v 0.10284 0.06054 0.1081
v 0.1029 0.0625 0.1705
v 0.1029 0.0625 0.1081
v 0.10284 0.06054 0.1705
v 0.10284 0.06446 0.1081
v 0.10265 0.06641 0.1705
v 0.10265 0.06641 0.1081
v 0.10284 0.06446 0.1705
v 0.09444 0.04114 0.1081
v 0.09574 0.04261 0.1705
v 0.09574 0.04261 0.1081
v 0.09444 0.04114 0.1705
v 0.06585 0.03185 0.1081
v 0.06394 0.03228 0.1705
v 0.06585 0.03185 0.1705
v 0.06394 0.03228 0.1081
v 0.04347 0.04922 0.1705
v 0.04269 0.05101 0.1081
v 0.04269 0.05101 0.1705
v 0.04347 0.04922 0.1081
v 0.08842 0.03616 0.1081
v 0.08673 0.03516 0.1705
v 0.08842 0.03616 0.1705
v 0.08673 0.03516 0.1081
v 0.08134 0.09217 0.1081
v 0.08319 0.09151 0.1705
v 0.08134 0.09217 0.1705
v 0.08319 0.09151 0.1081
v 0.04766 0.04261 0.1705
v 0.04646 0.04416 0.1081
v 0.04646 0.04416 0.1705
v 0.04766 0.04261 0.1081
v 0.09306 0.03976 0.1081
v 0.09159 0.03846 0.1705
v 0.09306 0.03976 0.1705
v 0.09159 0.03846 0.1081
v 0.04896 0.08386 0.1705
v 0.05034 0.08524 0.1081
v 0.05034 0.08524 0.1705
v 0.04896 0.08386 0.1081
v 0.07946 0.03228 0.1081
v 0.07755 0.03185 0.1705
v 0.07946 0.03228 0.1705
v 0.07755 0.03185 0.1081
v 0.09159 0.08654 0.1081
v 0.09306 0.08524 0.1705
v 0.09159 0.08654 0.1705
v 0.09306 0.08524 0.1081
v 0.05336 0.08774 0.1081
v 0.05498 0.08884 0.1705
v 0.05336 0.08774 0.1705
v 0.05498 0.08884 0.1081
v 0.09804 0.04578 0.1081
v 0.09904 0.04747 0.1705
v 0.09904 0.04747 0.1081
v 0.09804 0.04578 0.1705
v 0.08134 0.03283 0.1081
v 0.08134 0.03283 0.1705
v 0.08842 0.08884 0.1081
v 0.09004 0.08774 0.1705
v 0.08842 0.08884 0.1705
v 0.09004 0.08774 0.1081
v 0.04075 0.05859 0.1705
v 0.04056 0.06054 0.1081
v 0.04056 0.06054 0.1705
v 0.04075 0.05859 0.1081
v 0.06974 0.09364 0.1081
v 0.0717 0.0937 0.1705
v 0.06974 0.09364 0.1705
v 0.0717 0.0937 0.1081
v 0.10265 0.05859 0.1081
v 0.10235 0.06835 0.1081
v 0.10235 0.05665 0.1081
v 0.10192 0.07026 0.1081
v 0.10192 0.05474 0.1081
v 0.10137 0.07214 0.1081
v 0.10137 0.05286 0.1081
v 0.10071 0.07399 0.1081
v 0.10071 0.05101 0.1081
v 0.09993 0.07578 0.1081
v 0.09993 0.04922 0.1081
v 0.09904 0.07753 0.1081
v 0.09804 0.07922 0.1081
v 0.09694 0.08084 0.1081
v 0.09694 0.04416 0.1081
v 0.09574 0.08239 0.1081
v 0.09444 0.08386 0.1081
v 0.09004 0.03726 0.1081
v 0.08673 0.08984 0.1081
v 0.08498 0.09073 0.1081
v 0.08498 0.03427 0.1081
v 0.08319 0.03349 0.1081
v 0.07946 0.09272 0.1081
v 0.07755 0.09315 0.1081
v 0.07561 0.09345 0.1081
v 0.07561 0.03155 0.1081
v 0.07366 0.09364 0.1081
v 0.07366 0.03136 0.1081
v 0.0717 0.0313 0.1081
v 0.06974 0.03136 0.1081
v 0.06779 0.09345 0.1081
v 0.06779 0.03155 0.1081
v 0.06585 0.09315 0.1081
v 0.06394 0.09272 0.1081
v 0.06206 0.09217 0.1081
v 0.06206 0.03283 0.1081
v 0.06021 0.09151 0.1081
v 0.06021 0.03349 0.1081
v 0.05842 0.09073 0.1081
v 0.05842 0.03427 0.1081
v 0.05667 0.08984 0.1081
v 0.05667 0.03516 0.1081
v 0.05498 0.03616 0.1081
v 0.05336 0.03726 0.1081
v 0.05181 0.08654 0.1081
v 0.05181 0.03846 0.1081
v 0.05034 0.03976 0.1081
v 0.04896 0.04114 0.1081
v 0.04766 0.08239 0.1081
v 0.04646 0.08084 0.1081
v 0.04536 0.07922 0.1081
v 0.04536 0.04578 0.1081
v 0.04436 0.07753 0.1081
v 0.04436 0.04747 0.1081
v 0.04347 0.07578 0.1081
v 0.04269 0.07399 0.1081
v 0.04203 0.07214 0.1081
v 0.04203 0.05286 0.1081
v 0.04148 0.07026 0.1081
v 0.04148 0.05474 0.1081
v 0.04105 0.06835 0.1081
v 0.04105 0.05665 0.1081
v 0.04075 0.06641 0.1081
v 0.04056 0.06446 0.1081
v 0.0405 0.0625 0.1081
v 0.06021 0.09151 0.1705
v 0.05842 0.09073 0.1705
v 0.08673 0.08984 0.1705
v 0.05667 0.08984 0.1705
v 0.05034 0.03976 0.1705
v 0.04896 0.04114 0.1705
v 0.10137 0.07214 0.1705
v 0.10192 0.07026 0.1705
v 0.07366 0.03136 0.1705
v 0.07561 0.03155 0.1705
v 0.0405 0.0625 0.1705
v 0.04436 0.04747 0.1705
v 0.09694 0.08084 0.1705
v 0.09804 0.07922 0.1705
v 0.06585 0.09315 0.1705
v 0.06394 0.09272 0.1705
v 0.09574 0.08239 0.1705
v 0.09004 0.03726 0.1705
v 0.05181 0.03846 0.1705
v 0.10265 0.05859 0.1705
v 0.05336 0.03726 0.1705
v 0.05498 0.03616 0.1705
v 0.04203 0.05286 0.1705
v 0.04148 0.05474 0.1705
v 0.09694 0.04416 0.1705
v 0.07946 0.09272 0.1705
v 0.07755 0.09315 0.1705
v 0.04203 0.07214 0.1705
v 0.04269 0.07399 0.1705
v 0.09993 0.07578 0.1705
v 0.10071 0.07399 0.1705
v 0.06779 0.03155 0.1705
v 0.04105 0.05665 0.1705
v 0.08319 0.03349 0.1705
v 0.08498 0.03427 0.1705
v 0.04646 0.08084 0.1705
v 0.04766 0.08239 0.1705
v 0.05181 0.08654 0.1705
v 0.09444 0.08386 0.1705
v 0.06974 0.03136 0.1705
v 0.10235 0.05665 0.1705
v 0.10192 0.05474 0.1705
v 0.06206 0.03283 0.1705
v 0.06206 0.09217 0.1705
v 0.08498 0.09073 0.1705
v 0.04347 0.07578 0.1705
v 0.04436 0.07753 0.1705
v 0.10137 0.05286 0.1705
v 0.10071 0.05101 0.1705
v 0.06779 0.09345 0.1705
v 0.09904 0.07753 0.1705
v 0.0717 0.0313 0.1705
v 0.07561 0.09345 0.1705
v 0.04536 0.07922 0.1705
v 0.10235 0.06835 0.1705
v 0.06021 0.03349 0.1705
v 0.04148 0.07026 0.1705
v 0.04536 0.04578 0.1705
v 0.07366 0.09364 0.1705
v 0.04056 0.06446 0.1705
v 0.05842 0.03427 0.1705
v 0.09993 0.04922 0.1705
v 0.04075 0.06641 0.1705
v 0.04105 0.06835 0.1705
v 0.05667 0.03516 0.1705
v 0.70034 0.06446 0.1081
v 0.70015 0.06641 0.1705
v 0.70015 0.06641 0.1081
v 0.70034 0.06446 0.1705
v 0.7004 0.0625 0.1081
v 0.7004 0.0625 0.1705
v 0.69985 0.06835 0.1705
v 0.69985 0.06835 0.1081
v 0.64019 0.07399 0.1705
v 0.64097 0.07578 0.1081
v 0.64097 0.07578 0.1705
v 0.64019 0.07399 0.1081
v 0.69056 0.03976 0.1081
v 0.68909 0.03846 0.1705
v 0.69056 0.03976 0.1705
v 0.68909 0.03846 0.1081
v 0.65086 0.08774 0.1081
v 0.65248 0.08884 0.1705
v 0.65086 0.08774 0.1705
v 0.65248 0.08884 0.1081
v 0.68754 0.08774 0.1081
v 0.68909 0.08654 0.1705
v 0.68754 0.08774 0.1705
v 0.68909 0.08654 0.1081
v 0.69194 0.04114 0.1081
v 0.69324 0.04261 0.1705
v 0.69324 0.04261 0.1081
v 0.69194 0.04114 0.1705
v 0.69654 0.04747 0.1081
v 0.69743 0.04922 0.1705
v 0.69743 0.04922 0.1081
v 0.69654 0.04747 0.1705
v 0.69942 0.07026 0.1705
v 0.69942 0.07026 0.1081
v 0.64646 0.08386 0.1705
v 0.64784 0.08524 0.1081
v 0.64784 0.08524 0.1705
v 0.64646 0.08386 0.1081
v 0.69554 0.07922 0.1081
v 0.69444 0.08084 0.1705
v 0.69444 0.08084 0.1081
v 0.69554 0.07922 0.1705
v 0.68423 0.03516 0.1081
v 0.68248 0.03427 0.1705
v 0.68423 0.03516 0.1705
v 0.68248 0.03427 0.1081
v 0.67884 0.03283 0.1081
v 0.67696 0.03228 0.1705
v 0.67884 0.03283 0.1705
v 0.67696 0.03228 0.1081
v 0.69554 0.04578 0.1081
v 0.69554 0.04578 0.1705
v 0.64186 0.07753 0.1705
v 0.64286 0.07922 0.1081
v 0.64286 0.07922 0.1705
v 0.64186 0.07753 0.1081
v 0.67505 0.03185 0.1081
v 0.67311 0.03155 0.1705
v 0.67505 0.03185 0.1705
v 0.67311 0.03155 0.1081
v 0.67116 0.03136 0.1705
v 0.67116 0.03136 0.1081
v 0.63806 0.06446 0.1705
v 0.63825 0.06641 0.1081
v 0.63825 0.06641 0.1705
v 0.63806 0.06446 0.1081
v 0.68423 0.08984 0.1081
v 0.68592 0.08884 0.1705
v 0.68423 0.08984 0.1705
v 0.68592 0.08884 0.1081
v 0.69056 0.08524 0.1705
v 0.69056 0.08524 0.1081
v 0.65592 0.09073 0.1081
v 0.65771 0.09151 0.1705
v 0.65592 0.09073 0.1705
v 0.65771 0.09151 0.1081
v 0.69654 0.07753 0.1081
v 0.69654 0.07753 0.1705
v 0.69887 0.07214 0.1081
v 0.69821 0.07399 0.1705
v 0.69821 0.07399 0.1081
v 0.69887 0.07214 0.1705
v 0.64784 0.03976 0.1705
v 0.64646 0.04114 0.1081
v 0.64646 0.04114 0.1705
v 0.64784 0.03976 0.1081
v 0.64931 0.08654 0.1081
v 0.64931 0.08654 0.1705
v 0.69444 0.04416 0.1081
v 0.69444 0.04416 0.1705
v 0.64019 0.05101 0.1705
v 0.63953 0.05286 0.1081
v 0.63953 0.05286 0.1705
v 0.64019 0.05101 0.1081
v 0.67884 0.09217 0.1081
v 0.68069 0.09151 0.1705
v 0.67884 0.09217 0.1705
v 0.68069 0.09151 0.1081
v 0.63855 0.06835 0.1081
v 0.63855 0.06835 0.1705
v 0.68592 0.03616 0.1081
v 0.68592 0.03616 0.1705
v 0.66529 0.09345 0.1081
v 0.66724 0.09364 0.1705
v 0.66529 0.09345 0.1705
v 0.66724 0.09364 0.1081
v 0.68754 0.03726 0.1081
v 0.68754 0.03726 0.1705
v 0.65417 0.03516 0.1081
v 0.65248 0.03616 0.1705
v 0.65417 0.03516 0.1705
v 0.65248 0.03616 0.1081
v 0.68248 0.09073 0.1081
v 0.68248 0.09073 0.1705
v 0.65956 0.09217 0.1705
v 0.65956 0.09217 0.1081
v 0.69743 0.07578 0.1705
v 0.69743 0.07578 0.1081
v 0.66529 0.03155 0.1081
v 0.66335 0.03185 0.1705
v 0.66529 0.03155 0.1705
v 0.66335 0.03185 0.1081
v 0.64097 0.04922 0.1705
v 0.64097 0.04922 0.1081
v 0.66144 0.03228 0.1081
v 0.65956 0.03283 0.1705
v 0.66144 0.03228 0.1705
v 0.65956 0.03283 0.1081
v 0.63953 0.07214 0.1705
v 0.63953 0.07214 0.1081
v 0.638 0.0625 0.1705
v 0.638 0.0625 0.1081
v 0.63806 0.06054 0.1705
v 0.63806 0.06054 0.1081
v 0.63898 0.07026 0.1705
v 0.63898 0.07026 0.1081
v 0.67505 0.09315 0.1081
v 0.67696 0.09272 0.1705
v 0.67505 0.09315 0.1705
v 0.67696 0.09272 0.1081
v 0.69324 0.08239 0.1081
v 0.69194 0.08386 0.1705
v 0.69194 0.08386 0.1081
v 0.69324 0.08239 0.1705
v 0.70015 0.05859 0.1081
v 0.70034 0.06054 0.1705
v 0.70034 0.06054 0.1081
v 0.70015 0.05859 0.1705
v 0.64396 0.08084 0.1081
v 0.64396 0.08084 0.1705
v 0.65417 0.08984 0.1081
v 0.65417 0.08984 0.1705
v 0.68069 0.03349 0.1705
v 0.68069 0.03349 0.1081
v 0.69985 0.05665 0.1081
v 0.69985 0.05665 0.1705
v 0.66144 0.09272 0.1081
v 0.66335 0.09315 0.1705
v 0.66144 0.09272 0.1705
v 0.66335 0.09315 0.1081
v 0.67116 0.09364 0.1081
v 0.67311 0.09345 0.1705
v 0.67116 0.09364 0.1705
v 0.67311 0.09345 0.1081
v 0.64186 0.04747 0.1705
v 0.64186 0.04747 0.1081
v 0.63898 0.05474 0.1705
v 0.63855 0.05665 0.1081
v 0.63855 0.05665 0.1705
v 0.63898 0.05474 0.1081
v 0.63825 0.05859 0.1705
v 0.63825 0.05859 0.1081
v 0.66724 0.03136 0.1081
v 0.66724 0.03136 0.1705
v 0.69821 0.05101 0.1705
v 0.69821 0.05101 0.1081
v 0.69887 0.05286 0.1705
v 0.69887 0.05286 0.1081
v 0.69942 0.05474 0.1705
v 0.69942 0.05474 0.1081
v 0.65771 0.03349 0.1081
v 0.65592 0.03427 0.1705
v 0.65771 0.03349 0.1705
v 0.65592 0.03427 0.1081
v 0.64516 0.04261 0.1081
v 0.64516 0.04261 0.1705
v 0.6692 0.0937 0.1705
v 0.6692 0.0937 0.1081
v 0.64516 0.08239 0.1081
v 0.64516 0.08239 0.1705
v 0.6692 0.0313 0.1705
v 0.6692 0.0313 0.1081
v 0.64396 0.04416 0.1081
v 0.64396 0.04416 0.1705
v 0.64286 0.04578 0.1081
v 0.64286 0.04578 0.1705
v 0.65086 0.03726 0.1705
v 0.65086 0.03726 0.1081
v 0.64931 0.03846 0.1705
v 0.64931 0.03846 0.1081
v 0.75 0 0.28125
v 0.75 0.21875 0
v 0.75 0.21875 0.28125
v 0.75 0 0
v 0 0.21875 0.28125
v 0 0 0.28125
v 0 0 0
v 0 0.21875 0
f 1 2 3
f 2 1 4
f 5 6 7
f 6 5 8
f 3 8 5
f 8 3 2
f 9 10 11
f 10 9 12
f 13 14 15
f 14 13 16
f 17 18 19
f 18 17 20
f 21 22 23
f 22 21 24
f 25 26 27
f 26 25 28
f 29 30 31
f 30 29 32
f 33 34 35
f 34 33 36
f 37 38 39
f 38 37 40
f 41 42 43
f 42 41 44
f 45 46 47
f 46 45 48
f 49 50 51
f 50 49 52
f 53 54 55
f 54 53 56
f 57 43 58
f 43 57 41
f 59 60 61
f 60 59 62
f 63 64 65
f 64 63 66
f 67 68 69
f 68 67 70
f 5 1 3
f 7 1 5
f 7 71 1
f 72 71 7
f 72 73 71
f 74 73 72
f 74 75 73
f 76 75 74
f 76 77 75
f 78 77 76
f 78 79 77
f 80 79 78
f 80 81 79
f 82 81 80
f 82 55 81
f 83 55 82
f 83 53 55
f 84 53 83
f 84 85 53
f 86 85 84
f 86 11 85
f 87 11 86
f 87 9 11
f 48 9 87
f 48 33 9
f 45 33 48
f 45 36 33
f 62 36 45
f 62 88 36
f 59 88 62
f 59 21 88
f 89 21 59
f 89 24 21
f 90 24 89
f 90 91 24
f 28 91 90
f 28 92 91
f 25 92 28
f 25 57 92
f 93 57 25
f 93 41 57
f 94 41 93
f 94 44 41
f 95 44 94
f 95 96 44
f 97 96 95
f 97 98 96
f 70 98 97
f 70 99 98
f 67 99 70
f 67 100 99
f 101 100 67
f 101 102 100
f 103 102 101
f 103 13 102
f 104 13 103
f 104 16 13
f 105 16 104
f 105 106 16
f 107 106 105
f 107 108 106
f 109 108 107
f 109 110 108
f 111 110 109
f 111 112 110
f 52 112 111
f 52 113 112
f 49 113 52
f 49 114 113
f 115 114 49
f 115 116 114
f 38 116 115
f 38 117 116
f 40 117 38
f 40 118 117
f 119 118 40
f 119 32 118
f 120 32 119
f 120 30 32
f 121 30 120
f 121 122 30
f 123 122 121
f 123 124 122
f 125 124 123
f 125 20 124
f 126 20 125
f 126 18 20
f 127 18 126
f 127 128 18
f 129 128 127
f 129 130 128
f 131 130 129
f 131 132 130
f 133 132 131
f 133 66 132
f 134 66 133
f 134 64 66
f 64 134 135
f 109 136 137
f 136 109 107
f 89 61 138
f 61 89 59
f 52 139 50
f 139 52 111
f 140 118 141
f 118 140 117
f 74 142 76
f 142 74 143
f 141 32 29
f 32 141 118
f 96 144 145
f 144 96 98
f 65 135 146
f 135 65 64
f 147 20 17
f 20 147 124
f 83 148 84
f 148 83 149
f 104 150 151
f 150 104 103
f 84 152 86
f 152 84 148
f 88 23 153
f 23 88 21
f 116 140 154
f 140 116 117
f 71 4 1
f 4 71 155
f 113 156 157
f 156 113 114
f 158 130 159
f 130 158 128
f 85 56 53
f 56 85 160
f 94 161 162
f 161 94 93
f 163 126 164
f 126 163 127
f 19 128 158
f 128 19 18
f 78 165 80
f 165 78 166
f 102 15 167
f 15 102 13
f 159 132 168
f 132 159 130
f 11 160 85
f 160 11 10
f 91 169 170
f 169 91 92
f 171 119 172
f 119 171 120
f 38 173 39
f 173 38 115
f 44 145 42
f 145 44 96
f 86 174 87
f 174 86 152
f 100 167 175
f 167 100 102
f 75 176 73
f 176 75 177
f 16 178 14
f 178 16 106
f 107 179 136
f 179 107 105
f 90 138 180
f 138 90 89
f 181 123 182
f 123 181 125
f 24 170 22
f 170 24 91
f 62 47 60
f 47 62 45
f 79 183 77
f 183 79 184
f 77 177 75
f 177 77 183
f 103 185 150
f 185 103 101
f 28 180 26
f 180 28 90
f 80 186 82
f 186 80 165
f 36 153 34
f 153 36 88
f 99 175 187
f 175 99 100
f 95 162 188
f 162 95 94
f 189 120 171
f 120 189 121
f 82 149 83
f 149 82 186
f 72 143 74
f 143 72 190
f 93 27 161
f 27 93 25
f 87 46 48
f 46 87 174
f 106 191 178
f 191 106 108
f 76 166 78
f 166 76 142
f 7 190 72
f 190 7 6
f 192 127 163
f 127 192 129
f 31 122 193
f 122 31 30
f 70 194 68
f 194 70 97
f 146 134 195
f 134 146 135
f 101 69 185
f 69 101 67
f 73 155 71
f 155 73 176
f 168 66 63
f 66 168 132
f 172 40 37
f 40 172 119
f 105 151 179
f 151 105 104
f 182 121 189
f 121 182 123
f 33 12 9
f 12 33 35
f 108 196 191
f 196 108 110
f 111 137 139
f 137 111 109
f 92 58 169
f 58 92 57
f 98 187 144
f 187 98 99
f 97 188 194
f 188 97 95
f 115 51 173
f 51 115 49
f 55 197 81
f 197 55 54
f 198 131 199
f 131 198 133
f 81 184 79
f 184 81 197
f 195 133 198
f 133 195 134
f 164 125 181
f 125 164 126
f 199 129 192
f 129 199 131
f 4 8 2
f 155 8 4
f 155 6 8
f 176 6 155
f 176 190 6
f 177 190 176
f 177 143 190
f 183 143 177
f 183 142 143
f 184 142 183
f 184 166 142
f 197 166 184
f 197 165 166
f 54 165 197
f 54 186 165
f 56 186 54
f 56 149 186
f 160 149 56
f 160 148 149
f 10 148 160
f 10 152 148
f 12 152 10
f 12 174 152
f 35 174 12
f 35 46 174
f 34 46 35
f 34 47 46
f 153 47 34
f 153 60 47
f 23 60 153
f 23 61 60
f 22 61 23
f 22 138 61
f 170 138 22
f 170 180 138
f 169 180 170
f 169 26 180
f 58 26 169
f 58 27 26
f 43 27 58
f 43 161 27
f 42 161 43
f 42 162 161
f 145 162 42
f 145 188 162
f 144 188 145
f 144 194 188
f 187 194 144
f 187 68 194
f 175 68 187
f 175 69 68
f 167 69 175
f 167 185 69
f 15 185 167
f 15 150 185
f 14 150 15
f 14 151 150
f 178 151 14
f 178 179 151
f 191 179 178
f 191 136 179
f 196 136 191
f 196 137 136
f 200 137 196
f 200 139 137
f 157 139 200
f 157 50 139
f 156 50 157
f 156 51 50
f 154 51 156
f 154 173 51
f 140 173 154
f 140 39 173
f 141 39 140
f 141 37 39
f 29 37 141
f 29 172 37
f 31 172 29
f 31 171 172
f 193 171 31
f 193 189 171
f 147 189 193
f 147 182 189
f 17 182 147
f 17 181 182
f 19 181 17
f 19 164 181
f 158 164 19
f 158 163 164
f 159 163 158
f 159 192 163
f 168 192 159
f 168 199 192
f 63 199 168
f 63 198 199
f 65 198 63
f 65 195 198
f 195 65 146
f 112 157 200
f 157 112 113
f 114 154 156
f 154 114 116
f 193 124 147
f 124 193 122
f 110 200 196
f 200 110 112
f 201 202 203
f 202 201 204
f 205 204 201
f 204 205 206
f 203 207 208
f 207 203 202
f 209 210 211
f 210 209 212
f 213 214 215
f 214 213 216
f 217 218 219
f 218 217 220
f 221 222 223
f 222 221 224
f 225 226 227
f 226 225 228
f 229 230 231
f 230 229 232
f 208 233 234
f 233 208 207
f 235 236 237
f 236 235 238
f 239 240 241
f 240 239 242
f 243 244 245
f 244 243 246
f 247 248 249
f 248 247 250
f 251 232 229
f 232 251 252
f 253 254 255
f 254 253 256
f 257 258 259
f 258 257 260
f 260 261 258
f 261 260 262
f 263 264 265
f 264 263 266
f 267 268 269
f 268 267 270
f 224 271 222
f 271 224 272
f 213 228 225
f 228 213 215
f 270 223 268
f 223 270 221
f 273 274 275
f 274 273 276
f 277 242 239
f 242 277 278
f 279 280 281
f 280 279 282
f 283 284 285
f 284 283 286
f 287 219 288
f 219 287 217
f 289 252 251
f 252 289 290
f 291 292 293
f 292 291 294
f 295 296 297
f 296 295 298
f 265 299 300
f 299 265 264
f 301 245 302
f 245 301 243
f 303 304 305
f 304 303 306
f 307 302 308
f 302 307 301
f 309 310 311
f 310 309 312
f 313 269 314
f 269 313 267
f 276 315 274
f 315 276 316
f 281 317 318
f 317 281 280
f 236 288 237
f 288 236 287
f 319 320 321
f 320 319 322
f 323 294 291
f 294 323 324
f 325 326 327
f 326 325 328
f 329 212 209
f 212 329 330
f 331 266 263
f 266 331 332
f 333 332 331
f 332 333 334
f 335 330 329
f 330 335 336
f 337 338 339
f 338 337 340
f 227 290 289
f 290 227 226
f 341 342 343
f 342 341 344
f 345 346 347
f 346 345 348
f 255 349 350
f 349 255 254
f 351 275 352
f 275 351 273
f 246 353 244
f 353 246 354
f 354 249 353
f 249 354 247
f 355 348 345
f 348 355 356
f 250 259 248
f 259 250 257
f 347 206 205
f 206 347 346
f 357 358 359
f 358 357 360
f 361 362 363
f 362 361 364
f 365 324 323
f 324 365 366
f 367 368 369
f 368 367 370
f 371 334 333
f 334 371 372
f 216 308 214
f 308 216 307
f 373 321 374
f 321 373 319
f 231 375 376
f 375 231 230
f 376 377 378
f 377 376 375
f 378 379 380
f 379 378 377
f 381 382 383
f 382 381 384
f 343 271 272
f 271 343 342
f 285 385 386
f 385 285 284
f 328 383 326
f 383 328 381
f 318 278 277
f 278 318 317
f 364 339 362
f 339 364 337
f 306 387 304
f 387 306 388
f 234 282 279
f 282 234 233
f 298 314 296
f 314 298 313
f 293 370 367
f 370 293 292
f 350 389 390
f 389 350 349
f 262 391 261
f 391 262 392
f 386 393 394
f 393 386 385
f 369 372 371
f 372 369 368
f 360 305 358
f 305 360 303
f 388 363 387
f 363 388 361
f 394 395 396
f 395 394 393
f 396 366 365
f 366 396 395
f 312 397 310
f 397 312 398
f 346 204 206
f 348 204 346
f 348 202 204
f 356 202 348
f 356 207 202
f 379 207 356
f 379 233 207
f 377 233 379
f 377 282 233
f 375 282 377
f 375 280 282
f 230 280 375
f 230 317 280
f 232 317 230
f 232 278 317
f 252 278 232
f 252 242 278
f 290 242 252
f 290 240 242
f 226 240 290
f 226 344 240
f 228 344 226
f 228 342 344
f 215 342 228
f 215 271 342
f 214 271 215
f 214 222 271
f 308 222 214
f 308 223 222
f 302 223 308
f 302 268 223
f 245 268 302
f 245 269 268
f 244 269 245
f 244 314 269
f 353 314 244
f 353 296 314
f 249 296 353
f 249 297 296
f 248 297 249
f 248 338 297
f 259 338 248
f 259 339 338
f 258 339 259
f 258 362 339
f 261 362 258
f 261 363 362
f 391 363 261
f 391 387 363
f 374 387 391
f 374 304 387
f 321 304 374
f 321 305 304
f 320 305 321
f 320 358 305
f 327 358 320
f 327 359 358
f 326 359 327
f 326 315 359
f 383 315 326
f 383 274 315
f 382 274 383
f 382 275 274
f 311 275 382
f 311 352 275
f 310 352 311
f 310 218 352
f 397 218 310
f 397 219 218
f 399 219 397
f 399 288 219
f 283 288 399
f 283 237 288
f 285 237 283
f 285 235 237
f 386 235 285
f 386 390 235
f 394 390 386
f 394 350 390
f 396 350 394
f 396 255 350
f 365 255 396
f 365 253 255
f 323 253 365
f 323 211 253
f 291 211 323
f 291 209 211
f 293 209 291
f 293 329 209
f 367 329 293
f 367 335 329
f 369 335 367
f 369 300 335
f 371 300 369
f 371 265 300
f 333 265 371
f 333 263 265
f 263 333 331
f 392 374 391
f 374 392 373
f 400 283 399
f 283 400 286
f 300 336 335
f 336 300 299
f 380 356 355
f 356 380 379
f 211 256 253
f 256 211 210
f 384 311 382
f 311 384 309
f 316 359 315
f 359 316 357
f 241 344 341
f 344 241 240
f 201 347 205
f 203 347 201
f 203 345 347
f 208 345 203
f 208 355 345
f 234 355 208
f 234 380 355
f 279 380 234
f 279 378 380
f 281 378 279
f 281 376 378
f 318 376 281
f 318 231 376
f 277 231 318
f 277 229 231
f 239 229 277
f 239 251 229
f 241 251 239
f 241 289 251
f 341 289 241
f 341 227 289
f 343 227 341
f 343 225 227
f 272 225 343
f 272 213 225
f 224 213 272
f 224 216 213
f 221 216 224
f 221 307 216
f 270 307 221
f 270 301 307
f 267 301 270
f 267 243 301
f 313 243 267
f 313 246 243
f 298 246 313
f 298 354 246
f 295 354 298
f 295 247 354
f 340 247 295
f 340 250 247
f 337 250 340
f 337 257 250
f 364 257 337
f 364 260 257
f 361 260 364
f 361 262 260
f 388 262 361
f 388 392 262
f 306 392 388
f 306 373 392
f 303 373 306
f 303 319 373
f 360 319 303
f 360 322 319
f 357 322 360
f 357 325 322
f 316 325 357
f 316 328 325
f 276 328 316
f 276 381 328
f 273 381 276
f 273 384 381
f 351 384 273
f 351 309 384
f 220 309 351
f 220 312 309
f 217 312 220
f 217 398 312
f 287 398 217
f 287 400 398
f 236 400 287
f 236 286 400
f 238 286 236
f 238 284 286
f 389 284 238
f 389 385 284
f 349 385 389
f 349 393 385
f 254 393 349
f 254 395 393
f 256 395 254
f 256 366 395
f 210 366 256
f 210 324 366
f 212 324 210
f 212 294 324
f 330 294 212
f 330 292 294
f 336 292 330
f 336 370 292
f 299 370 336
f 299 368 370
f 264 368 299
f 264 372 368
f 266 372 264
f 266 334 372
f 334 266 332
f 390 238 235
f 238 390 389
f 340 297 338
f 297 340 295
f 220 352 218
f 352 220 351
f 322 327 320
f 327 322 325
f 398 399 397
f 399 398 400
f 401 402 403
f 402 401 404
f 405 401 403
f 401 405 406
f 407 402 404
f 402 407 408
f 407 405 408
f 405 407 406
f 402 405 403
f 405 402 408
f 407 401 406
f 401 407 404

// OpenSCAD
// CAD Model: Base with two internal cylindrical voids
// All dimensions are in inches/mm as per the provided unitless values.

$fn = 100; // High resolution for smooth circular profiles

// --- Parameters ---

// Main base dimensions
base_length = 0.75;
base_width = 0.21875;
base_height = 0.28125;

// Remove-material feature parameters
hole_radius = 0.0312;
hole1_x = 0.0717;      // Distance from left edge for first axis
hole2_x = 0.6692;      // Distance from left edge for second axis
hole_y = 0.0625;       // Distance from front edge for both axes

// Cut height parameters (Z-axis)
cut_z_start = 0.1081;  // Bottom of the removed band
cut_z_end = 0.1705;    // Top of the removed band
cut_depth = cut_z_end - cut_z_start; // ~0.0624 (matches the 0.0625 declared depth)

// --- Modules ---

// Module for the main rectangular base
module main_base() {
    // Formed as one solid upper-side extrusion from the base datum (z=0),
    // filling the footprint to the left, right, front, and back edges.
    cube([base_length, base_width, base_height]);
}

// Module for the subtractive features
module removed_features() {
    // Feature made only from 2 separate circular profiles
    // The intervening material is left solid (not a connected slot)
    
    // First circular profile (Left)
    translate([hole1_x, hole_y, cut_z_start])
        cylinder(h=cut_depth, r=hole_radius);
        
    // Second circular profile (Right)
    translate([hole2_x, hole_y, cut_z_start])
        cylinder(h=cut_depth, r=hole_radius);
}

// --- Main Assembly ---

// Subtract the circular profiles from the main base
difference() {
    main_base();
    removed_features();
}
